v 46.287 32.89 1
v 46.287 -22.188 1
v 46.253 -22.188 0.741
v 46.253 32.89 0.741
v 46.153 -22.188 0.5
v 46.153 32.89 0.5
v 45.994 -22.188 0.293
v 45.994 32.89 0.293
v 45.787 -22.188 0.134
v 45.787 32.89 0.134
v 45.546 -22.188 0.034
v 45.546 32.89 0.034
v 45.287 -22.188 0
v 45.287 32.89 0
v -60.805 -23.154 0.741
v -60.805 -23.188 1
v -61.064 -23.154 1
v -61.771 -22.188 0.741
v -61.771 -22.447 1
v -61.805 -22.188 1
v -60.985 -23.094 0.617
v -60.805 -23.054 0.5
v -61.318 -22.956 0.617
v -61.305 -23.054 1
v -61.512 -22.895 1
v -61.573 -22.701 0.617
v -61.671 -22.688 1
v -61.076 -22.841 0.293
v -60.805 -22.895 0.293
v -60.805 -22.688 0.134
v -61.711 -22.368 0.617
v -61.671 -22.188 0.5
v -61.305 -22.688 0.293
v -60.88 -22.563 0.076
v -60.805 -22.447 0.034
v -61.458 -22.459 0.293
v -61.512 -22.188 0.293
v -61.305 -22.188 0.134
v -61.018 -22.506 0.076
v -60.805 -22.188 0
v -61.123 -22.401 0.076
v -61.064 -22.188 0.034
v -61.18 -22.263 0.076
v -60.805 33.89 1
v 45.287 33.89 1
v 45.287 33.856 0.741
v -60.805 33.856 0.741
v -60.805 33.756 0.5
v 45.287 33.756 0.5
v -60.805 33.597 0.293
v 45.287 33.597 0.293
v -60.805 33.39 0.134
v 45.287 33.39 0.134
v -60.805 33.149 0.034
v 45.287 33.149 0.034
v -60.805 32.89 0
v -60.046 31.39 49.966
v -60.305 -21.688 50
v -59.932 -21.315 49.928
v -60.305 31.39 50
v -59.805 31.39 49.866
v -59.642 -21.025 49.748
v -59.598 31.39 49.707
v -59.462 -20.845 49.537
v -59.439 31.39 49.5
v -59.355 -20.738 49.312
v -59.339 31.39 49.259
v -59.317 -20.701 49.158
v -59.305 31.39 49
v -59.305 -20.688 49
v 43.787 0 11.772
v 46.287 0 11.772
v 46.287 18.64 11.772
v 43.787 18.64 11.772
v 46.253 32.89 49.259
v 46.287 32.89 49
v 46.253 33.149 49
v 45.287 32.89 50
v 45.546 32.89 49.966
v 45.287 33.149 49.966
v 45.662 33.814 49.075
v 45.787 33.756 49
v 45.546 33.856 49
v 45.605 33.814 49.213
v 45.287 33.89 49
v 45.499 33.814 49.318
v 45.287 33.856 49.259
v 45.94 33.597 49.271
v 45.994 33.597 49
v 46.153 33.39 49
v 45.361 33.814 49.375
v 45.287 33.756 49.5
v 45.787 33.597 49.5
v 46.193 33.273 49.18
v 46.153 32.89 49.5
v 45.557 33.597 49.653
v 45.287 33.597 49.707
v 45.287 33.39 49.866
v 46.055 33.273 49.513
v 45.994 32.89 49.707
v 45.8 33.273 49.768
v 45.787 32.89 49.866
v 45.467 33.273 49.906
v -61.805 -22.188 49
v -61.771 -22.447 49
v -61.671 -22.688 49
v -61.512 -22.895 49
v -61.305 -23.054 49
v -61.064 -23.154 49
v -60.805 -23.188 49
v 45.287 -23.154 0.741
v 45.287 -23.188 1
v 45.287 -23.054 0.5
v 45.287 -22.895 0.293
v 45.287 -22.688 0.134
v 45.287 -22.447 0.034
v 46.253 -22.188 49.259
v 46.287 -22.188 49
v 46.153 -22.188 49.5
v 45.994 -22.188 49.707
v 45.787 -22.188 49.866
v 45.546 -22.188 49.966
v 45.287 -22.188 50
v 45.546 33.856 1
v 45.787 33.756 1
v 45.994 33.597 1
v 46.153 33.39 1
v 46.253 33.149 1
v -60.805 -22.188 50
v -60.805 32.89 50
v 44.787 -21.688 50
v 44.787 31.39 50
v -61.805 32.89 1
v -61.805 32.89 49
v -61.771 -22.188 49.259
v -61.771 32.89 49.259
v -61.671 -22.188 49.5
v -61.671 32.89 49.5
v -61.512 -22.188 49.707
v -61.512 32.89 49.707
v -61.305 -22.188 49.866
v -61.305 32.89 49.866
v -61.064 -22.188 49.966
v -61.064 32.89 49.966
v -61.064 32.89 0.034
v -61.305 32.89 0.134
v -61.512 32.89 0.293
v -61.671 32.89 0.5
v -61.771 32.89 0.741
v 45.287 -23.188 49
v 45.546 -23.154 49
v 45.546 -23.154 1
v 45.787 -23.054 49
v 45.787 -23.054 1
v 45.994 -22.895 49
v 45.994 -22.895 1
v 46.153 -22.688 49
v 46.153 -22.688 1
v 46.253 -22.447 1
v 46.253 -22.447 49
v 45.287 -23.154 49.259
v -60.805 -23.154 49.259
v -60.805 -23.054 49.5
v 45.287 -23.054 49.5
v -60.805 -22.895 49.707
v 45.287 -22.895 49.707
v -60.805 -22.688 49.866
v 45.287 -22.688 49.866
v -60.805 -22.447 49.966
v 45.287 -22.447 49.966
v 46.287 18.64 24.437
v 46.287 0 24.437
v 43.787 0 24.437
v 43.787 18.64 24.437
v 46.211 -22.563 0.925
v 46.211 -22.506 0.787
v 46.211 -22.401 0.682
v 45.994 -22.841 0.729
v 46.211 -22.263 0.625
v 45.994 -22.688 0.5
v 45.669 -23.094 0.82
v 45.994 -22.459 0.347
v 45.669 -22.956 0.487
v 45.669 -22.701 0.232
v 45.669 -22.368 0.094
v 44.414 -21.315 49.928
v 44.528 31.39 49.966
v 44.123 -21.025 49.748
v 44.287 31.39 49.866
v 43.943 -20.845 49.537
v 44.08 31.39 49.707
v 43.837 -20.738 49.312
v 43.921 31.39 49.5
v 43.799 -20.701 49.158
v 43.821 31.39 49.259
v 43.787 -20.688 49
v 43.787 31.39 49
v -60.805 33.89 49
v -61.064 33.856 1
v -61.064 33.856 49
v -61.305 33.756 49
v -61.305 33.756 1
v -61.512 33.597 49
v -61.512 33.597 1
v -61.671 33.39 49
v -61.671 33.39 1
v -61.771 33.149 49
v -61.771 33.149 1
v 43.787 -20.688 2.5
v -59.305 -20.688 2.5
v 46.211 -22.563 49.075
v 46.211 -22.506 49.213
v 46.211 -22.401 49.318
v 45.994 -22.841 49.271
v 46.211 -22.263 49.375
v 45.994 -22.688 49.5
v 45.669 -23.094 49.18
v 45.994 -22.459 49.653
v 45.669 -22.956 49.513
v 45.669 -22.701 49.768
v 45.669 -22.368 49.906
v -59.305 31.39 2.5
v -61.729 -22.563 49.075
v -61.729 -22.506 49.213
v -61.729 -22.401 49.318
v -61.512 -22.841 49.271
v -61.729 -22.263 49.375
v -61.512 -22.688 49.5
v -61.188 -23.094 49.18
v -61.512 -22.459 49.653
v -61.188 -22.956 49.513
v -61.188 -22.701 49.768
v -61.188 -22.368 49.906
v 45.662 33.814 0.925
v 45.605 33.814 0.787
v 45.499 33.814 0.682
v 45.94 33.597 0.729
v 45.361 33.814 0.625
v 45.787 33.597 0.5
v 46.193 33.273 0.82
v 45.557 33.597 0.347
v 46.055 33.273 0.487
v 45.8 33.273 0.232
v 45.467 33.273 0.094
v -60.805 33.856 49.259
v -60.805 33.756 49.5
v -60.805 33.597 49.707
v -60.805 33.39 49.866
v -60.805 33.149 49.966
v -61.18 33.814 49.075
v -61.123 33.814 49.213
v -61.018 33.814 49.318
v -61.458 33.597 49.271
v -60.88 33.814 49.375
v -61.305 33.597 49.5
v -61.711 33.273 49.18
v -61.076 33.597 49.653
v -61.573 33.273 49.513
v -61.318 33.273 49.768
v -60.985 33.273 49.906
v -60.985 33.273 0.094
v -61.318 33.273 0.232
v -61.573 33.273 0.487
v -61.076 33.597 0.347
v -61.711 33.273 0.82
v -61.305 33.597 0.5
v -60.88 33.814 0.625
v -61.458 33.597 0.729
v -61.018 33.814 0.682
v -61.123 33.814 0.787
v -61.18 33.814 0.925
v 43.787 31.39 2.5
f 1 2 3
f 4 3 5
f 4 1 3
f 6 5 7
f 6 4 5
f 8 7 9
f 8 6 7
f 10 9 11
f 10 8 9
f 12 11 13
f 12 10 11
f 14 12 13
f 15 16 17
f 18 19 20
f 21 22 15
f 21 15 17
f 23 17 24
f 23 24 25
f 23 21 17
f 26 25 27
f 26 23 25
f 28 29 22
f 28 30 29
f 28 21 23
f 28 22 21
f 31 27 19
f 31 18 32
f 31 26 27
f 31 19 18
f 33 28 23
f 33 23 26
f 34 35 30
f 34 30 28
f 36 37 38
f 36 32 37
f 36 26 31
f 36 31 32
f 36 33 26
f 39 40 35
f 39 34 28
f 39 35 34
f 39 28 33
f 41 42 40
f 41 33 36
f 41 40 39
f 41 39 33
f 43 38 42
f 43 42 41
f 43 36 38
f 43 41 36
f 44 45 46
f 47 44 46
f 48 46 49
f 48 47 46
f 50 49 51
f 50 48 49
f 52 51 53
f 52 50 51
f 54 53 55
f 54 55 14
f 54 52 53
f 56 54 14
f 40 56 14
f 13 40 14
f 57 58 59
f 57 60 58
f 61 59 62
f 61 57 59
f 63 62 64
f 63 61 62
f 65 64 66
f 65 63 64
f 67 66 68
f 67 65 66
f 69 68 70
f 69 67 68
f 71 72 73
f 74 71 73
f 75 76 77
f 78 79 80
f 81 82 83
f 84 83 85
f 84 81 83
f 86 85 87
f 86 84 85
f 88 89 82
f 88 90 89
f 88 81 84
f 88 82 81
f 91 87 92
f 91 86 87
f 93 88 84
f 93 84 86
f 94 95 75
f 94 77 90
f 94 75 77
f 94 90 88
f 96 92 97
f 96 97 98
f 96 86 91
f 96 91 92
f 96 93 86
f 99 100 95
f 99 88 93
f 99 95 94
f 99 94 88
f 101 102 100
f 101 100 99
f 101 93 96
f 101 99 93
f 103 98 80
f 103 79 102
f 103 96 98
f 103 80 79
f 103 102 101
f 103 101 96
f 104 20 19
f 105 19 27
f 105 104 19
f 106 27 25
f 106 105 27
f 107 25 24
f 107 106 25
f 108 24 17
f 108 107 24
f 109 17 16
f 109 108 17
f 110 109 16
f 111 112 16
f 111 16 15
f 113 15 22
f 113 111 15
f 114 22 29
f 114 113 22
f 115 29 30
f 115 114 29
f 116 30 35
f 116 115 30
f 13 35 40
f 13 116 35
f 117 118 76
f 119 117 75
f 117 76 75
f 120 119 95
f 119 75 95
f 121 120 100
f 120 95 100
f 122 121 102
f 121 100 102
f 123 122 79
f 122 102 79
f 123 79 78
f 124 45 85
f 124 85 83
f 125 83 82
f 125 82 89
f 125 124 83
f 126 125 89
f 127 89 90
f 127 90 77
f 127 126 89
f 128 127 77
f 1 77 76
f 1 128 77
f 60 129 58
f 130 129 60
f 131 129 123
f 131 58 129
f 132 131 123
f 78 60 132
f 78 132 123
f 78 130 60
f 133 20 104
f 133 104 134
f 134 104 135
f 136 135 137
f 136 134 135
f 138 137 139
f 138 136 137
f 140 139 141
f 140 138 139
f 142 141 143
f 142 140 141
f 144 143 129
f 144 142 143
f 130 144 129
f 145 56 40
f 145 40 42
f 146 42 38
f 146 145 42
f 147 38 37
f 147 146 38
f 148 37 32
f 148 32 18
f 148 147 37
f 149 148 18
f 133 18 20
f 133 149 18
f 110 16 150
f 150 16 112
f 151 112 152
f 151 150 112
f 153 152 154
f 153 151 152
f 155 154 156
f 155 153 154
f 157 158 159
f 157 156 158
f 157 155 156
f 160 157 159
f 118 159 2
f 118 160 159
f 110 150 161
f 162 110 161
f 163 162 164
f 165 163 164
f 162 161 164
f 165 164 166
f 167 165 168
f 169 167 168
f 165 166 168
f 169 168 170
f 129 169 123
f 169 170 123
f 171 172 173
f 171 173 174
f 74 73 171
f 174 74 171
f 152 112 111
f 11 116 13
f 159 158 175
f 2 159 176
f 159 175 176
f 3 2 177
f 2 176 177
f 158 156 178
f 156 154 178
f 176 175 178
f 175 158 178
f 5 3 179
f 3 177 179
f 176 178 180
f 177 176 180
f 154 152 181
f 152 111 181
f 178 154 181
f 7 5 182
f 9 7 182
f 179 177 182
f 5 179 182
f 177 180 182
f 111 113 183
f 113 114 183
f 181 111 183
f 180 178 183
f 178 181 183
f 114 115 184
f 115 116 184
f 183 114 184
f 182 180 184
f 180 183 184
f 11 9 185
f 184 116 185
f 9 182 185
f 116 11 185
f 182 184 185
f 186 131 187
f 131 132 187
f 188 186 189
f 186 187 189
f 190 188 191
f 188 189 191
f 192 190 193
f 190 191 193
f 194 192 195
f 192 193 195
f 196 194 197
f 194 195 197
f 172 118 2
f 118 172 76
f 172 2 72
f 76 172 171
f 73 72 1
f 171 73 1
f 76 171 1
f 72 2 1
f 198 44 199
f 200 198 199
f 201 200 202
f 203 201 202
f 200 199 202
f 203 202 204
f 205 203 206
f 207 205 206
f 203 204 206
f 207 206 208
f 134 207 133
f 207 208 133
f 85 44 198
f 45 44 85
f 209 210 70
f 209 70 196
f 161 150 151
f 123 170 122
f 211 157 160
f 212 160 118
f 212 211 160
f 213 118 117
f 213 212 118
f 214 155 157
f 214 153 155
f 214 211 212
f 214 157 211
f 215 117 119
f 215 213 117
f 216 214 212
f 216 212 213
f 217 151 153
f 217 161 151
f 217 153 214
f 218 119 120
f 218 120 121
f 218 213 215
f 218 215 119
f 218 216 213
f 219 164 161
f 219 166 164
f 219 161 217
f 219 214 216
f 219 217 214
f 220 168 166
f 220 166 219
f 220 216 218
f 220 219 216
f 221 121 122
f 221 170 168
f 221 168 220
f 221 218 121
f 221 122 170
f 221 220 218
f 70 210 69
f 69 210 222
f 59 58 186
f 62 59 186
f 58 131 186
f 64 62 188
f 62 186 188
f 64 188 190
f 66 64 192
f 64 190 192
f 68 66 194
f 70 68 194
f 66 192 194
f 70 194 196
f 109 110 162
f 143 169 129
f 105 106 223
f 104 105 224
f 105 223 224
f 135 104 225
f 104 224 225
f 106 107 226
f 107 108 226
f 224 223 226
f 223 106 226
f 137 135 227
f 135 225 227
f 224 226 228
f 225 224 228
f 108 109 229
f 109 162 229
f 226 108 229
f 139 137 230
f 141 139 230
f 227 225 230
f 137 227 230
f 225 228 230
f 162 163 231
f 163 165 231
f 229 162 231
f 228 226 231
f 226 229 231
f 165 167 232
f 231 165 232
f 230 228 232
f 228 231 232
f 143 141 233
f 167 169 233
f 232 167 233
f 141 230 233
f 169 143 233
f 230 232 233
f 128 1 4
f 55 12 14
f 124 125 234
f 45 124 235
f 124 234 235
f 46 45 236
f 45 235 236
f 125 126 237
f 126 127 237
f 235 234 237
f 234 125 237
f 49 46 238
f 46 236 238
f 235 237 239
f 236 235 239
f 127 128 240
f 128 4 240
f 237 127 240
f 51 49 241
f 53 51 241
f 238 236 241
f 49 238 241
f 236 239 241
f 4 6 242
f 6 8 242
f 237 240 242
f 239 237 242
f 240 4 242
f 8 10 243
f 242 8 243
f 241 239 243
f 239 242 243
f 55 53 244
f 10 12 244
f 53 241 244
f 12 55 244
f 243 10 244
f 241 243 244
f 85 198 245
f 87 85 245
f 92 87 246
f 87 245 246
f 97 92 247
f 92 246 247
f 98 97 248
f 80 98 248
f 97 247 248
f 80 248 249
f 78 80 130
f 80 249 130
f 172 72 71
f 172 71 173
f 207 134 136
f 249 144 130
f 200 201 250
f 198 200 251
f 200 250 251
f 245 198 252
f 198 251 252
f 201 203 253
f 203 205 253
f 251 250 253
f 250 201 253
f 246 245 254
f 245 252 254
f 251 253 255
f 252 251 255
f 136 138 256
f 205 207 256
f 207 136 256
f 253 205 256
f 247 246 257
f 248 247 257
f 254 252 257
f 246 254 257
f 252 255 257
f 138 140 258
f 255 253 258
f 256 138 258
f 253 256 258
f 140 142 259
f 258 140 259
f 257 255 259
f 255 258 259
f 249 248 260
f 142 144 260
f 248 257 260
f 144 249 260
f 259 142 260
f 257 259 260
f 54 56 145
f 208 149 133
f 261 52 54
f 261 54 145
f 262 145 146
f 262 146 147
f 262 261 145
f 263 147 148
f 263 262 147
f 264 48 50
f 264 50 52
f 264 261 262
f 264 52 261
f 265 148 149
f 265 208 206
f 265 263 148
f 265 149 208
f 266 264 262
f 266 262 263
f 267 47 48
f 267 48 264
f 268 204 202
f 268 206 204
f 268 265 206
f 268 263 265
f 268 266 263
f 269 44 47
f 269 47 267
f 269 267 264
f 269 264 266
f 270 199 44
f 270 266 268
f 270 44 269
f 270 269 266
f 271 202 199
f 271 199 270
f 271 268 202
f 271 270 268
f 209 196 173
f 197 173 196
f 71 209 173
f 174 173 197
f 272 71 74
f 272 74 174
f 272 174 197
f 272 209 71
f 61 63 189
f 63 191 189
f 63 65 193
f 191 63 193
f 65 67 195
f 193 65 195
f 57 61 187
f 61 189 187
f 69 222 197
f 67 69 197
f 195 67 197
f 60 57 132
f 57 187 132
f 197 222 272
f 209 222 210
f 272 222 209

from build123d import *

# Parameters (mm, degrees)
F0_W         = 108.091738075
F0_H         = 57.078147307
F1_DEPTH     = 50
F2_T         = -2.5
F3_R         = 1
F4_T1_DEPTH  = 48
F4_T3_DEPTH  = 106.091738075
F4_T5_DEPTH  = 55.078147307
F4_S9_W      = 1
F4_S9_H      = 1
F4_T10_DEPTH = 1
F4_S15_W     = 1
F4_S15_H     = 1
F4_T16_DEPTH = 1
F4_T20_ANGLE = 90
F4_T22_ANGLE = 90
F4_T24_ANGLE = 90
F5_W         = 18.639581278
F5_H         = 12.6642128453
F6_DEPTH     = 25


# Not quite as in the source:
# - a fillet or chamfer that OpenCascade refuses, or shapes differently, is made with other operations: its cross-section is extruded or revolved along the edge and cut away or added


with BuildPart() as f1:
    # F0 (on Top) → F1 (new body)
    with BuildSketch(Plane.XY):
        with Locations((-7.7590625733, 5.3510768339)):
            Rectangle(F0_W, F0_H)
    extrude(amount=F1_DEPTH)

    # F2
    f2_openings = [f1.faces().sort_by_distance(p)[0] for p in [
        (-7.759063, 5.351077, 50),
    ]]
    offset(amount=F2_T, openings=f2_openings)

    # F3
    f3_edges = [f1.edges().sort_by_distance(p)[0] for p in [
        (-7.759063, -23.187997, 50),
        (-61.804932, -23.187997, 25),
        (-7.759063, -20.687997, 50),
        (-59.304932, 5.351077, 50),
        (-61.804932, 5.351077, 50),
        (-7.759063, -23.187997, 0),
        (46.286806, -23.187997, 25),
        (43.786806, 5.351077, 50),
        (46.286806, 5.351077, 50),
        (46.286806, 5.351077, 0),
    ]]
    fillet(f3_edges, radius=F3_R)

    # F4: fillet of radius 1 on 3 edges, made by hand

    # F4_s2 → F4_t1 (cut)
    with BuildSketch(Plane.XY.offset(1)):
        with BuildLine():
            ThreePointArc((45.2868064642, 33.8901504874), (45.9939132454, 33.5972572686), (46.2868064642, 32.8901504874))
            Line((46.2868064642, 32.8901504874), (46.2868064642, 33.8901504874))
            Line((46.2868064642, 33.8901504874), (45.2868064642, 33.8901504874))
        make_face()
        with BuildLine():
            ThreePointArc((-60.8049316108, 33.8901504874), (-61.512038392, 33.5972572686), (-61.8049316108, 32.8901504874))
            Line((-61.8049316108, 32.8901504874), (-61.8049316108, 33.8901504874))
            Line((-61.8049316108, 33.8901504874), (-60.8049316108, 33.8901504874))
        make_face()
    extrude(amount=F4_T1_DEPTH, mode=Mode.SUBTRACT)

    # F4_s4 → F4_t3 (cut)
    with BuildSketch(Plane.YZ.offset(-60.8049316108)):
        with BuildLine():
            ThreePointArc((33.8901504874, 49), (33.5972572686, 49.7071067812), (32.8901504874, 50))
            Line((32.8901504874, 50), (33.8901504874, 50))
            Line((33.8901504874, 50), (33.8901504874, 49))
        make_face()
        with BuildLine():
            ThreePointArc((33.8901504874, 1), (33.5972572686, 0.2928932188), (32.8901504874, 0))
            Line((32.8901504874, 0), (33.8901504874, 0))
            Line((33.8901504874, 0), (33.8901504874, 1))
        make_face()
    extrude(amount=F4_T3_DEPTH, mode=Mode.SUBTRACT)

    # F4_s6 → F4_t5 (cut)
    with BuildSketch(Plane.XZ.offset(-32.8901504874)):
        with BuildLine():
            ThreePointArc((-60.8049316108, 0), (-61.512038392, 0.2928932188), (-61.8049316108, 1))
            Line((-61.8049316108, 1), (-61.8049316108, 0))
            Line((-61.8049316108, 0), (-60.8049316108, 0))
        make_face()
    extrude(amount=F4_T5_DEPTH, mode=Mode.SUBTRACT)


with BuildPart() as f4_tool8:
    # F4_s9 → F4_t10 (new body)
    with BuildSketch(Plane.XY.offset(1)):
        with Locations((-61.3049316108, -22.6879968196)):
            Rectangle(F4_S9_W, F4_S9_H)
    extrude(amount=-F4_T10_DEPTH)

    # F4_s11 → F4_t12 (revolve, cut)
    with BuildSketch(Plane(origin=(-60.8049316108, -22.1879968196, 1), x_dir=(0.7071067812, 0.7071067812, 0), z_dir=(-0.7071067812, 0.7071067812, 0))):
        with BuildLine():
            ThreePointArc((0, -1), (1, 0), (0, 1))
            Line((0, 1), (0, -1))
        make_face()
    revolve(axis=Axis((-60.8049316108, -22.1879968196, 1), (0, 0, -1)), mode=Mode.SUBTRACT)


with BuildPart() as f1_1:
    add(f1.part)

    # F4_t7: cut F4_tool8
    add(f4_tool8.part, mode=Mode.SUBTRACT)


with BuildPart() as f4_tool14:
    # F4_s15 → F4_t16 (new body)
    with BuildSketch(Plane.XZ.offset(-32.8901504874)):
        with Locations((-61.3049316108, 0.5)):
            Rectangle(F4_S15_W, F4_S15_H)
    extrude(amount=-F4_T16_DEPTH)

    # F4_s17 → F4_t18 (revolve, cut)
    with BuildSketch(Plane(origin=(-60.8049316108, 32.8901504874, 1), x_dir=(0.7071067812, 0, 0.7071067812), z_dir=(-0.7071067812, 0, 0.7071067812))):
        with BuildLine():
            ThreePointArc((0, -1), (1, 0), (0, 1))
            Line((0, 1), (0, -1))
        make_face()
    revolve(axis=Axis((-60.8049316108, 32.8901504874, 1), (0, 1, 0)), mode=Mode.SUBTRACT)


with BuildPart() as f1_2:
    add(f1_1.part)

    # F4_t13: cut F4_tool14
    add(f4_tool14.part, mode=Mode.SUBTRACT)

    # F4_s19 → F4_t20 (revolve, cut)
    with BuildSketch(Plane.XY.offset(49)):
        with BuildLine():
            ThreePointArc((45.2868064642, 33.8901504874), (45.9939132454, 33.5972572686), (46.2868064642, 32.8901504874))
            Line((46.2868064642, 32.8901504874), (46.2868064642, 33.8901504874))
            Line((46.2868064642, 33.8901504874), (45.2868064642, 33.8901504874))
        make_face()
    revolve(axis=Axis((45.2868064642, 33.8901504874, 49), (0, -1, 0)), revolution_arc=F4_T20_ANGLE, mode=Mode.SUBTRACT)

    # F4_s21 → F4_t22 (revolve, cut)
    with BuildSketch(Plane.XY.offset(49)):
        with BuildLine():
            ThreePointArc((-60.8049316108, 33.8901504874), (-61.512038392, 33.5972572686), (-61.8049316108, 32.8901504874))
            Line((-61.8049316108, 32.8901504874), (-61.8049316108, 33.8901504874))
            Line((-61.8049316108, 33.8901504874), (-60.8049316108, 33.8901504874))
        make_face()
    revolve(axis=Axis((-60.8049316108, 33.8901504874, 49), (0, 1, 0)), revolution_arc=F4_T22_ANGLE, mode=Mode.SUBTRACT)

    # F4_s23 → F4_t24 (revolve, cut)
    with BuildSketch(Plane.XY.offset(1)):
        with BuildLine():
            ThreePointArc((45.2868064642, 33.8901504874), (45.9939132454, 33.5972572686), (46.2868064642, 32.8901504874))
            Line((46.2868064642, 32.8901504874), (46.2868064642, 33.8901504874))
            Line((46.2868064642, 33.8901504874), (45.2868064642, 33.8901504874))
        make_face()
    revolve(axis=Axis((45.2868064642, 33.8901504874, 1), (0, 1, 0)), revolution_arc=F4_T24_ANGLE, mode=Mode.SUBTRACT)

    # F5 (on face) → F6 (cut)
    with BuildSketch(Plane.YZ.offset(46.2868064642)):
        with Locations((9.319790639, 18.1044735946)):
            Rectangle(F5_W, F5_H)
    extrude(amount=-F6_DEPTH, mode=Mode.SUBTRACT)


solid = f1_2.part
